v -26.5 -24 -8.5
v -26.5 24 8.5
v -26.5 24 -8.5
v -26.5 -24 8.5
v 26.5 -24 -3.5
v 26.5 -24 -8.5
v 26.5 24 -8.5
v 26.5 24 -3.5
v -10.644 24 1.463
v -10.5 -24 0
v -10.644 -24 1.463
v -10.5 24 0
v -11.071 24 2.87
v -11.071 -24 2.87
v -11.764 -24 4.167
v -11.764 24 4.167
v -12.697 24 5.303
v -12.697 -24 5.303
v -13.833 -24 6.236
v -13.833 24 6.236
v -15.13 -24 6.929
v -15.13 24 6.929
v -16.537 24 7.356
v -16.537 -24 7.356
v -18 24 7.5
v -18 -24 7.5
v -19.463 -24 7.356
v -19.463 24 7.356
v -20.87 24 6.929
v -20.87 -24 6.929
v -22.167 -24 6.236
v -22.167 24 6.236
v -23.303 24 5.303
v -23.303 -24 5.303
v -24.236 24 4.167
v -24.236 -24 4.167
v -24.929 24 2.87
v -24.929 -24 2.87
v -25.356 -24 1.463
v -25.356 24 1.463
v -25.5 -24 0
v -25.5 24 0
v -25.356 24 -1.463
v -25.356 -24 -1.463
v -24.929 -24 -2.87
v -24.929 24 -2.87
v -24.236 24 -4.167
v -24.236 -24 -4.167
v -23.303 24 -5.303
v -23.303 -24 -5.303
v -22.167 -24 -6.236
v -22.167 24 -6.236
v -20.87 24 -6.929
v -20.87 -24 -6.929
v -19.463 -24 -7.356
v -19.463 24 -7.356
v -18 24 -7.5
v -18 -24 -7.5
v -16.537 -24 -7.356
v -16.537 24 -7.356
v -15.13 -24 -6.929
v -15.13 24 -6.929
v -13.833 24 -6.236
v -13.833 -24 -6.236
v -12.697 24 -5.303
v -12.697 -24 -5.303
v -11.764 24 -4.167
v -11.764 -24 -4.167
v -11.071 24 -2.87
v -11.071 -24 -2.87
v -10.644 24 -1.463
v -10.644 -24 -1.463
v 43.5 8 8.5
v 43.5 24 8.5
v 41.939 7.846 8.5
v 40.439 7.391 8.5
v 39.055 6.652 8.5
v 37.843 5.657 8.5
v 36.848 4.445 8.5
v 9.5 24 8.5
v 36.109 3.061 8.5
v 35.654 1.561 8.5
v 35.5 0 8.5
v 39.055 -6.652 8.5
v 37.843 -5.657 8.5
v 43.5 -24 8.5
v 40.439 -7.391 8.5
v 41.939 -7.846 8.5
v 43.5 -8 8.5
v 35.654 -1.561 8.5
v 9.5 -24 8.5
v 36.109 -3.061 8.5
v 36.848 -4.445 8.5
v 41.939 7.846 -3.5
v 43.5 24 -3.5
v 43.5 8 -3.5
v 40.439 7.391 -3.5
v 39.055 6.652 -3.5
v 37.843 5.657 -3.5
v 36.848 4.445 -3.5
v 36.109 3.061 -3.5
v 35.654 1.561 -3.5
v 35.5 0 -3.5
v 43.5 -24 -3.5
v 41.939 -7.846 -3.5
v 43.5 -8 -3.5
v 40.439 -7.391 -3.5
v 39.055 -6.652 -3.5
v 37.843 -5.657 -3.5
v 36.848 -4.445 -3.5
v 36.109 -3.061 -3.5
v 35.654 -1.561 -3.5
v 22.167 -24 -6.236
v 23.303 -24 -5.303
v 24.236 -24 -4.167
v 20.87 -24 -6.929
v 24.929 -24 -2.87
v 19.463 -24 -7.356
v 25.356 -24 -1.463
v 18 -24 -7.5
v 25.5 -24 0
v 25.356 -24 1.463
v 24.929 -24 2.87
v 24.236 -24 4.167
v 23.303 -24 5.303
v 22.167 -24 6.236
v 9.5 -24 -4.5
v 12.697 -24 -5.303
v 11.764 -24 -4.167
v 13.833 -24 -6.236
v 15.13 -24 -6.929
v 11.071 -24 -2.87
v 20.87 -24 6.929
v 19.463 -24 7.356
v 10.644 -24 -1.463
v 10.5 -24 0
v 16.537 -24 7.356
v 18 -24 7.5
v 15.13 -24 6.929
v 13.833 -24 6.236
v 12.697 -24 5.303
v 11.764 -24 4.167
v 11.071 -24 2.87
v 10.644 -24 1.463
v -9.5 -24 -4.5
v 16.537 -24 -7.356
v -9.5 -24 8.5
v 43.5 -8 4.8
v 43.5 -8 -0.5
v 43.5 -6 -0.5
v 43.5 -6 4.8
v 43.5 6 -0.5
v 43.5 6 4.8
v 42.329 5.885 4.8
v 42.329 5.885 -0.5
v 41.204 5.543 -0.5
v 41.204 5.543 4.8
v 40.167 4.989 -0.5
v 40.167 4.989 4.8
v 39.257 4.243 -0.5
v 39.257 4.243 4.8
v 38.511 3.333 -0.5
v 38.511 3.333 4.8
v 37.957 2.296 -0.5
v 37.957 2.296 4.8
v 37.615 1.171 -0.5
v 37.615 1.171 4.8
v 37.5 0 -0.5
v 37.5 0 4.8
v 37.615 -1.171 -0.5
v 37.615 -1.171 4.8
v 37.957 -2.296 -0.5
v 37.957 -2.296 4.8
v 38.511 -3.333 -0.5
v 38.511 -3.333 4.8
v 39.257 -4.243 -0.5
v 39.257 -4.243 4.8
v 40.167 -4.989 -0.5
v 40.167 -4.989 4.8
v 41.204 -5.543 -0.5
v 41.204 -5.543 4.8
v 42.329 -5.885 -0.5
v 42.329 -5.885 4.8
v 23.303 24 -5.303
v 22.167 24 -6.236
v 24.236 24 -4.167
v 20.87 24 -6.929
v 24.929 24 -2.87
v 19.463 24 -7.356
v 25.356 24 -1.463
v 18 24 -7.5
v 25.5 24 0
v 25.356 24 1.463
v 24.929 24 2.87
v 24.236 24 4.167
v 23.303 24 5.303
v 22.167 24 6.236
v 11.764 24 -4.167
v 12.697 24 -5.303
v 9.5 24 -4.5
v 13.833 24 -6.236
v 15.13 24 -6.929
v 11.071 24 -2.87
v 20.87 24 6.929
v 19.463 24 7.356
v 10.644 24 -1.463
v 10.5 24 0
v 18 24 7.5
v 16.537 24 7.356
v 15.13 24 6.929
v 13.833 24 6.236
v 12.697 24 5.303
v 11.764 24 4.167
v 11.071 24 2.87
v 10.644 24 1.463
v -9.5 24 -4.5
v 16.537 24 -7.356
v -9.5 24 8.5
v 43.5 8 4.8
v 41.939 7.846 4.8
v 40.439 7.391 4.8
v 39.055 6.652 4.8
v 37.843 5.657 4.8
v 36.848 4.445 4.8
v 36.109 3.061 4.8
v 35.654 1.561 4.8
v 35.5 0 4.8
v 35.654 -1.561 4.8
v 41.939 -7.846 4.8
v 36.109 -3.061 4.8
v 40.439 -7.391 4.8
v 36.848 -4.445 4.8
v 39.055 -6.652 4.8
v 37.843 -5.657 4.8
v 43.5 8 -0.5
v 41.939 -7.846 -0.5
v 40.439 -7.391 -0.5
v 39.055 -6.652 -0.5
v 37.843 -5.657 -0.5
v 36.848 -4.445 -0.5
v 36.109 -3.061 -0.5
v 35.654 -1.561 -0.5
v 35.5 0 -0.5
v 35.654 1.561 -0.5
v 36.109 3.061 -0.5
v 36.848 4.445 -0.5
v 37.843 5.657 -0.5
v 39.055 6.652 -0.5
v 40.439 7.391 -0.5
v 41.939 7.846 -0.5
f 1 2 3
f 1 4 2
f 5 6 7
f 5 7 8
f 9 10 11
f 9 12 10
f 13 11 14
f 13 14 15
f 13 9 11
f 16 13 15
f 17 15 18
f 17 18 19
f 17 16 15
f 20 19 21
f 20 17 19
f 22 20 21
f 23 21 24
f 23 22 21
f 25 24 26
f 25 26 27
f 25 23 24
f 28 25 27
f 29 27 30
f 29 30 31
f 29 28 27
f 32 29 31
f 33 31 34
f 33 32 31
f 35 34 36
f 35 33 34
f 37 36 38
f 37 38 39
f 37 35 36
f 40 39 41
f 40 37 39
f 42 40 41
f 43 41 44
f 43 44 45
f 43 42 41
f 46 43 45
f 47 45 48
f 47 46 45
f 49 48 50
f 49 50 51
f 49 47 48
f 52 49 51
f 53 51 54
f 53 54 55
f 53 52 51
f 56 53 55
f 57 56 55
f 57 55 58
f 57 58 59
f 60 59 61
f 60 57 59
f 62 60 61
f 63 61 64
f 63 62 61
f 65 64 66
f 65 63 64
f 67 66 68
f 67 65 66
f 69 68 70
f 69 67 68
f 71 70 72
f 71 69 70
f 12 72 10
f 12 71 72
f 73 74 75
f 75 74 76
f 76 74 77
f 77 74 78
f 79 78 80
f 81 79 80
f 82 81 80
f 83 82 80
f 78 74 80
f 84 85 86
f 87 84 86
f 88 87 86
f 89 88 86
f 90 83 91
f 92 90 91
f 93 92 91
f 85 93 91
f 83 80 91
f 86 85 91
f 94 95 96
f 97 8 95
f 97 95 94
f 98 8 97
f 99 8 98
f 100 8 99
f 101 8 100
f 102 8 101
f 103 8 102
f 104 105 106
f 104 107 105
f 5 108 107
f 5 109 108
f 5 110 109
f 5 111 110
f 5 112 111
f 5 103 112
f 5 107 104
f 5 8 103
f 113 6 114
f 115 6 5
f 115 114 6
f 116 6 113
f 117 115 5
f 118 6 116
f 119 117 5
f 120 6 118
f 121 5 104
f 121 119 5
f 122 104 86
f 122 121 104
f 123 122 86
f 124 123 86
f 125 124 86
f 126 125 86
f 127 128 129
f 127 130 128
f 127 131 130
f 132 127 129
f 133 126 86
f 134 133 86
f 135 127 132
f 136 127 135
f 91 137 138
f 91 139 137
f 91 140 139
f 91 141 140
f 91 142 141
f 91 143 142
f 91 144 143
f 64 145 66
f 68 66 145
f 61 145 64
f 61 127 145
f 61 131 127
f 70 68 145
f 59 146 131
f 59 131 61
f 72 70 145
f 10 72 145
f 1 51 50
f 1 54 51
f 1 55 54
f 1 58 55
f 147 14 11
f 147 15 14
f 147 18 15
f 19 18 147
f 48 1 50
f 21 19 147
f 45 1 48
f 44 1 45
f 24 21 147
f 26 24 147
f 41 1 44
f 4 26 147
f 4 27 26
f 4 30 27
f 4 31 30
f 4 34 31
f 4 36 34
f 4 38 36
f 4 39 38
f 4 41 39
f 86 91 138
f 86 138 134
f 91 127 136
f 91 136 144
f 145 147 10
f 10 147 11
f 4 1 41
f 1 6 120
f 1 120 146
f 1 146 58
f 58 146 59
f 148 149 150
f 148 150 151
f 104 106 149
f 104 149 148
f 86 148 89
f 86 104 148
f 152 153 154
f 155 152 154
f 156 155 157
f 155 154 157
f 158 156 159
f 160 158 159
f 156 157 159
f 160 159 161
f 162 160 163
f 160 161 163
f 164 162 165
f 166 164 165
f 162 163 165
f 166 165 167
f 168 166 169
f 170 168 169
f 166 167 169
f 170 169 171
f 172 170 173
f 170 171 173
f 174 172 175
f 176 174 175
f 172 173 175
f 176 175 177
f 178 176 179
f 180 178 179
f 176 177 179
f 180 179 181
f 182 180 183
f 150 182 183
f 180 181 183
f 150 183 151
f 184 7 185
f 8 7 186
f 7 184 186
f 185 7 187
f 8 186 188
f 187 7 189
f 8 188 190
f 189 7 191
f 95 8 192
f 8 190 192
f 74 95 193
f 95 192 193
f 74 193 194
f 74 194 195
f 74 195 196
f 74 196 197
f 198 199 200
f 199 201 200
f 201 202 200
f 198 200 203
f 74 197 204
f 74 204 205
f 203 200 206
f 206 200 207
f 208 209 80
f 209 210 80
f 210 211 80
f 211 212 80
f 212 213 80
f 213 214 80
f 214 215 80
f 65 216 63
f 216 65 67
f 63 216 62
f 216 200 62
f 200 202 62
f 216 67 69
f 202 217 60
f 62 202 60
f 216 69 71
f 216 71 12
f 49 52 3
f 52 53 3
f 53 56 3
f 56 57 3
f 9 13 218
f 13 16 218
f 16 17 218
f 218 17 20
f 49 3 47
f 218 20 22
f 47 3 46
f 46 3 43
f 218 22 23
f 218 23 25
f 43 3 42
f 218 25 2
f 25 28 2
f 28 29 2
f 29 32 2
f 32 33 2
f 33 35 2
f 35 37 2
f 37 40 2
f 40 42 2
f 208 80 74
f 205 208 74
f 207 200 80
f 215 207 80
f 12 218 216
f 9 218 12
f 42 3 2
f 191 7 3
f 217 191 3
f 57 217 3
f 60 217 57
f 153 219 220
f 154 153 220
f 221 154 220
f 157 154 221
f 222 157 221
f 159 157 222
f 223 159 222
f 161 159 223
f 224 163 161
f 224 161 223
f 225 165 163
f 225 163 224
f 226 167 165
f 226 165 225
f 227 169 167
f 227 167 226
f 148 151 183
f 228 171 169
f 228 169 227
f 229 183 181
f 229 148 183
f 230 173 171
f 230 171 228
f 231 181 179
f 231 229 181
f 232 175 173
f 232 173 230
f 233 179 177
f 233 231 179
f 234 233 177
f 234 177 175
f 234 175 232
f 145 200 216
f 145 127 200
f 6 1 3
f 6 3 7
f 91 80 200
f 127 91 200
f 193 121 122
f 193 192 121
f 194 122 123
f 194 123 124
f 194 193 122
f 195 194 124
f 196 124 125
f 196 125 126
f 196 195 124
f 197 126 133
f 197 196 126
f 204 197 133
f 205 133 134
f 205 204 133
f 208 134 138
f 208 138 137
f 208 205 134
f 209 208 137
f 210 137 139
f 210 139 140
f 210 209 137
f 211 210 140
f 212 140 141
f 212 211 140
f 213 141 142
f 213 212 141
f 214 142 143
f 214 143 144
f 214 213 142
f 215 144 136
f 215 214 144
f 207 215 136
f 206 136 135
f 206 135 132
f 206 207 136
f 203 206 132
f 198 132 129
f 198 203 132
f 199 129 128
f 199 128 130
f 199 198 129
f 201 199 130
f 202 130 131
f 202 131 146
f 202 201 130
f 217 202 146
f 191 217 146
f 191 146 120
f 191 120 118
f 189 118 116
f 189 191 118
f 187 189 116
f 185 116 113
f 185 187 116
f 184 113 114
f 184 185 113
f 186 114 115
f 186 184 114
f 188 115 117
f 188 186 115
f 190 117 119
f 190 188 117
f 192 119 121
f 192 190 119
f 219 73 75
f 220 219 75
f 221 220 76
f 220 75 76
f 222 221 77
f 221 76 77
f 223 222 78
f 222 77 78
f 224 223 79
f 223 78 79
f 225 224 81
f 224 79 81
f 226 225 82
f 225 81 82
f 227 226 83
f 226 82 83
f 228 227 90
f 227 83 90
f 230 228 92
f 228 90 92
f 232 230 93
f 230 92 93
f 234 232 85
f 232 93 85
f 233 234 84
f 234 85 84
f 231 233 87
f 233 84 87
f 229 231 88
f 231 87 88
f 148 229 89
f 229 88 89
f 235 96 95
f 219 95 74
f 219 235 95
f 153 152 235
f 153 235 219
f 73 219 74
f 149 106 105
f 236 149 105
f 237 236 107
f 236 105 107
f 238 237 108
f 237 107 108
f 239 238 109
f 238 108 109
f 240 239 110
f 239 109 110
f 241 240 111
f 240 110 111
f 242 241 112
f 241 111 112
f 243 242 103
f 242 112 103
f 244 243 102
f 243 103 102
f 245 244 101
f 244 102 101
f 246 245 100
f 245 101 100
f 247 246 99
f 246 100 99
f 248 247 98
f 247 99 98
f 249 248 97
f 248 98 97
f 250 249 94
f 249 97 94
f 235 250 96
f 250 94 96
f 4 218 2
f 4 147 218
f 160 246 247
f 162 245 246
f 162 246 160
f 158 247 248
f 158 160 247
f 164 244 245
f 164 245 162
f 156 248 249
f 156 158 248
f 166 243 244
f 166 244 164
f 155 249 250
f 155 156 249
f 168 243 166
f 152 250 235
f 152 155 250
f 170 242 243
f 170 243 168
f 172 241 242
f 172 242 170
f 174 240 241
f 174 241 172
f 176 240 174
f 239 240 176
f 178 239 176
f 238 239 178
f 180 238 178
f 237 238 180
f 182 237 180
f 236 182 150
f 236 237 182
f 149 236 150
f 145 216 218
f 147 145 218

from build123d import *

# Parameters (mm, degrees)
SKETCH_R        = 7.5
PAD_DEPTH       = 24
SKETCH001_W     = 12
SKETCH001_H     = 48
PAD001_DEPTH    = 17
POCKET_DEPTH    = 17.001
POCKET001_DEPTH = 3.7
POCKET002_DEPTH = 3


with BuildPart() as part:
    # Sketch → Pad (new body, symmetric)
    with BuildSketch(Plane.XZ):
        Polygon((-26.5, 8.5), (-26.5, -8.5), (26.5, -8.5), (26.5, 8.5), (9.5, 8.5), (9.5, -4.5), (-9.5, -4.5), (-9.5, 8.5), align=None)
        with Locations((-18, 0)):
            Circle(SKETCH_R, mode=Mode.SUBTRACT)
        with Locations((18, 0)):
            Circle(SKETCH_R, mode=Mode.SUBTRACT)
    extrude(amount=PAD_DEPTH, both=True)

    # Sketch001 → Pad001 (new body)
    with BuildSketch(Plane(origin=(26.5, 0, 0), x_dir=(0, 0, 1), z_dir=(1, 0, 0))):
        with Locations((2.5, 0)):
            Rectangle(SKETCH001_W, SKETCH001_H)
    extrude(amount=PAD001_DEPTH)

    # Sketch002 → Pocket (cut, through all)
    with BuildSketch(Plane(origin=(0, 0, 8.5), x_dir=(-1, 0, 0), z_dir=(0, 0, 1))):
        with BuildLine():
            ThreePointArc((-43.5, -6), (-37.5, 0), (-43.5, 6))
            Line((-43.5, 6), (-55.5, 6))
            Line((-55.5, 6), (-55.5, -6))
            Line((-55.5, -6), (-43.5, -6))
        make_face()
    extrude(amount=-POCKET_DEPTH, mode=Mode.SUBTRACT)

    # Sketch003 → Pocket001 (cut)
    with BuildSketch(Plane(origin=(0, 0, 8.5), x_dir=(-1, 0, 0), z_dir=(0, 0, 1))):
        with BuildLine():
            ThreePointArc((-43.50003, -8), (-35.5, -1.5e-05), (-43.5, 8))
            Line((-43.5, 8), (-59.5, 8))
            Line((-59.5, 8), (-59.5, -8))
            Line((-59.5, -8), (-43.50003, -8))
        make_face()
    extrude(amount=-POCKET001_DEPTH, mode=Mode.SUBTRACT)

    # Sketch004 → Pocket002 (cut)
    with BuildSketch(Plane(origin=(0, 0, -3.5), x_dir=(1, 0, 0), z_dir=(0, 0, -1))):
        with BuildLine():
            ThreePointArc((43.5, 8), (35.500027, -1.3e-05), (43.500027, -8))
            Line((59.500053, -8), (43.500027, -8))
            Line((59.500053, 8.000053), (59.500053, -8))
            Line((43.5, 8), (59.500053, 8.000053))
        make_face()
    extrude(amount=-POCKET002_DEPTH, mode=Mode.SUBTRACT)


solid = part.part
